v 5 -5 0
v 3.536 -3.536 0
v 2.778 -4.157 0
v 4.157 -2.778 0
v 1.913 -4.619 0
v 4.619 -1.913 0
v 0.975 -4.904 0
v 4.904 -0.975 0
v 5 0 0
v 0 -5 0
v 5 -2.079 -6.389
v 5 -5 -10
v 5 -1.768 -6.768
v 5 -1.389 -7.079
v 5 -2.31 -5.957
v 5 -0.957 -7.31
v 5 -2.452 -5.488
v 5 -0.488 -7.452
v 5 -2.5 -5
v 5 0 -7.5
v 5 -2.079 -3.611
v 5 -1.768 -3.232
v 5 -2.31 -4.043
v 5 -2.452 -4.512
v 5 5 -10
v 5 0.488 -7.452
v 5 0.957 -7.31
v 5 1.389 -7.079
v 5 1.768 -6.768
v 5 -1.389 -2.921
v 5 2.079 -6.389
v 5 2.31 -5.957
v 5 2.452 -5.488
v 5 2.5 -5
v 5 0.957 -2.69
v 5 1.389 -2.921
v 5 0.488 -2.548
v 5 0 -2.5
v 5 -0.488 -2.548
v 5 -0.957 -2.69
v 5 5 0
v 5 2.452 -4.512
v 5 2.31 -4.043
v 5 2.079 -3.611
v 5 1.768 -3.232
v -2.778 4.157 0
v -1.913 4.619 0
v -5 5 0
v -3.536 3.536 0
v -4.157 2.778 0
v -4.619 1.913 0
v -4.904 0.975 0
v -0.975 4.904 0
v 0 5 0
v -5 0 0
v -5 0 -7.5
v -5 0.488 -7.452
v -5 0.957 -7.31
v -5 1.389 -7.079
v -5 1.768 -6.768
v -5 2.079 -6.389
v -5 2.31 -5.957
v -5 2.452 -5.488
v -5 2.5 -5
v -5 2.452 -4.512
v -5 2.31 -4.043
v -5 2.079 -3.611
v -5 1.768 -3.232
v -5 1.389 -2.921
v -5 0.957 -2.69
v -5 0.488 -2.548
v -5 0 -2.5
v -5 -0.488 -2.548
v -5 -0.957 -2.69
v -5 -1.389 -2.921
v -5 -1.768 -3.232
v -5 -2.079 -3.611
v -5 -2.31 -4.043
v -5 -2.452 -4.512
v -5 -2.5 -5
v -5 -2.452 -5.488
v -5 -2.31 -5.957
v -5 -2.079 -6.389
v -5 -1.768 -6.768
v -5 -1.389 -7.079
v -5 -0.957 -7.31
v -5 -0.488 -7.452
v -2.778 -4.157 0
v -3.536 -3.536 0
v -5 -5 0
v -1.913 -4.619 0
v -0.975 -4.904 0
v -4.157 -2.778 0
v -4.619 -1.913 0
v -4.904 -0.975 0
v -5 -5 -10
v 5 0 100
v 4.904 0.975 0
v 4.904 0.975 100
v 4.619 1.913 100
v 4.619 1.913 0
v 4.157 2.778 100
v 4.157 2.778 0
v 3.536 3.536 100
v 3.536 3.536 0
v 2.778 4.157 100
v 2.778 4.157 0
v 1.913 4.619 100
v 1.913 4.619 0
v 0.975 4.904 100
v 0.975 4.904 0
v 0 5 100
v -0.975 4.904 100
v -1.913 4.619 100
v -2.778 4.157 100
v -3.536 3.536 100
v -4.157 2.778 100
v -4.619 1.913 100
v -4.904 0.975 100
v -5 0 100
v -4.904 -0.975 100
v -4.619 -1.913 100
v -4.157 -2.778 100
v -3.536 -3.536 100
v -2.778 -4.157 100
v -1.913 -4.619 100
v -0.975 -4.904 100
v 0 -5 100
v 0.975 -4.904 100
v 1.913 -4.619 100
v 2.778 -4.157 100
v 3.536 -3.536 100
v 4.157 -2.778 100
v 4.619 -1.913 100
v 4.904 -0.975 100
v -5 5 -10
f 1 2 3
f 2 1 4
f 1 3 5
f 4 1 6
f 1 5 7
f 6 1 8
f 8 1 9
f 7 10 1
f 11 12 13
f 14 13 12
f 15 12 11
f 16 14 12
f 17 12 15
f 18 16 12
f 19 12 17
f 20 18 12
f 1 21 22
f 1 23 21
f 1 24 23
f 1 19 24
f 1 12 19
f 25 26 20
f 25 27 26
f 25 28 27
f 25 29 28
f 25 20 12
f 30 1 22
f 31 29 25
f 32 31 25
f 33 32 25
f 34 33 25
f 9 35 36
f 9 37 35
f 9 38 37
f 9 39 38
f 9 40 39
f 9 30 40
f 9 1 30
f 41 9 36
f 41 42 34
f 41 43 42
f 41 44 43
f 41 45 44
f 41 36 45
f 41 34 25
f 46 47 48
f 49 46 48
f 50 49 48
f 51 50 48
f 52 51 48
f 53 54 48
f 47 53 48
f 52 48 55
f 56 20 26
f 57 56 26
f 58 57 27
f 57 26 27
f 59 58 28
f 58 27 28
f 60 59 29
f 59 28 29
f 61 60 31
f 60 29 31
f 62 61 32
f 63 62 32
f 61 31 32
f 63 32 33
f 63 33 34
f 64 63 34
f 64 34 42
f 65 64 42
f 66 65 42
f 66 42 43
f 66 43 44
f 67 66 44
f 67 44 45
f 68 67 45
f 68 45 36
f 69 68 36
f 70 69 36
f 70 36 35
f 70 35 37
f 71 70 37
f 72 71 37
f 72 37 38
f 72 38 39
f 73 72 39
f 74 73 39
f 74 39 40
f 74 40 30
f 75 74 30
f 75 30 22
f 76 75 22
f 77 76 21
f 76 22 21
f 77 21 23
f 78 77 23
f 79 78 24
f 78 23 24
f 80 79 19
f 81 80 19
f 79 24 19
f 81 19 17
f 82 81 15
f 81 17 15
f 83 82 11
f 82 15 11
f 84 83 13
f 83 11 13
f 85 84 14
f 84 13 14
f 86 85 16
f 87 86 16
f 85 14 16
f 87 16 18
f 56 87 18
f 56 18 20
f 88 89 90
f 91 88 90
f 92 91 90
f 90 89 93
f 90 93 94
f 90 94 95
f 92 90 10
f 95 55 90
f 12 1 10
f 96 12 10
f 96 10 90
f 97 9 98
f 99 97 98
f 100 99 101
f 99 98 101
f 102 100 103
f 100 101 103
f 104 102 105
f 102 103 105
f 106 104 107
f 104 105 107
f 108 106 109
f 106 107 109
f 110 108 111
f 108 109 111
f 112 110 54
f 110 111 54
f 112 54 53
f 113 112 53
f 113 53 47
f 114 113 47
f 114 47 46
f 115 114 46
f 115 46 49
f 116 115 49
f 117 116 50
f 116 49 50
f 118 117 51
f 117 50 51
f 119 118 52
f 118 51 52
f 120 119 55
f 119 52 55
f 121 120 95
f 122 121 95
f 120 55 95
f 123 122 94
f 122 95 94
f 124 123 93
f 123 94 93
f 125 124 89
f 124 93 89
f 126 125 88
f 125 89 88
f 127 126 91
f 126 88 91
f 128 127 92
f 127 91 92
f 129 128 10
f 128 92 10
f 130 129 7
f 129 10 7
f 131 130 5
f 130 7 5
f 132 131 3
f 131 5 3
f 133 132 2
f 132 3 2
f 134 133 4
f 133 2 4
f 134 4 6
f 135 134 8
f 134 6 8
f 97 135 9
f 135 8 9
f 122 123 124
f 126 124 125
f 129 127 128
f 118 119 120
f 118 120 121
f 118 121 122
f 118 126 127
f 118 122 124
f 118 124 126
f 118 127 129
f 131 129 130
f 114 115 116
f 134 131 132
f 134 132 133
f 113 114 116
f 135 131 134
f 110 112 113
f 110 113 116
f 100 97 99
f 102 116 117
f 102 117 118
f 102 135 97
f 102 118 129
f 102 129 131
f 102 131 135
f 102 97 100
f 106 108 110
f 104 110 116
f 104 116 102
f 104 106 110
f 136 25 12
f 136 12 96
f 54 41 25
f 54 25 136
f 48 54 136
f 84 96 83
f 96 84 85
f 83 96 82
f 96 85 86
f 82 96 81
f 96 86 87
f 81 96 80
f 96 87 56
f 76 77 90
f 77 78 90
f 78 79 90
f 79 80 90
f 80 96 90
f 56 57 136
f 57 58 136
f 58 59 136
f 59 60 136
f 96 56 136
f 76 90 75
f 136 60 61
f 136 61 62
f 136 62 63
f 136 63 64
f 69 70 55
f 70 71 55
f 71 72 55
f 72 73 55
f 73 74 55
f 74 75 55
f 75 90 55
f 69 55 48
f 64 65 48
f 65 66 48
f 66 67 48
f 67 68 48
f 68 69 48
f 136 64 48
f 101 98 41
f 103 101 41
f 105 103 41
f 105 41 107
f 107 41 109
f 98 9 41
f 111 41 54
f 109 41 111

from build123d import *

# Parameters (mm, degrees)
SKETCH_1_R          = 5
EXTRUDE_1_DEPTH     = 100
SKETCH_2_W          = 10
SKETCH_2_H          = 10
EXTRUDE_2_DEPTH     = 10
SKETCH_3_R          = 2.5
CUT_EXTRUDE_1_DEPTH = 101.623058987


with BuildPart() as part:
    # 草图1 → 凸台-拉伸1 (new body)
    with BuildSketch(Plane.XY):
        Circle(SKETCH_1_R)
    extrude(amount=EXTRUDE_1_DEPTH)

    # 草图2 → 凸台-拉伸2 (add)
    with BuildSketch(Plane(origin=(0, 0, 0), x_dir=(-1, 0, 0), z_dir=(0, 0, -1))):
        Rectangle(SKETCH_2_W, SKETCH_2_H)
    extrude(amount=EXTRUDE_2_DEPTH)

    # 草图3 → 切除-拉伸1 (cut, through all)
    with BuildSketch(Plane(origin=(5, 0, 0), x_dir=(0, 0, -1), z_dir=(1, 0, 0))):
        with Locations((5, 0)):
            Circle(SKETCH_3_R)
    extrude(amount=-CUT_EXTRUDE_1_DEPTH, mode=Mode.SUBTRACT)


solid = part.part
